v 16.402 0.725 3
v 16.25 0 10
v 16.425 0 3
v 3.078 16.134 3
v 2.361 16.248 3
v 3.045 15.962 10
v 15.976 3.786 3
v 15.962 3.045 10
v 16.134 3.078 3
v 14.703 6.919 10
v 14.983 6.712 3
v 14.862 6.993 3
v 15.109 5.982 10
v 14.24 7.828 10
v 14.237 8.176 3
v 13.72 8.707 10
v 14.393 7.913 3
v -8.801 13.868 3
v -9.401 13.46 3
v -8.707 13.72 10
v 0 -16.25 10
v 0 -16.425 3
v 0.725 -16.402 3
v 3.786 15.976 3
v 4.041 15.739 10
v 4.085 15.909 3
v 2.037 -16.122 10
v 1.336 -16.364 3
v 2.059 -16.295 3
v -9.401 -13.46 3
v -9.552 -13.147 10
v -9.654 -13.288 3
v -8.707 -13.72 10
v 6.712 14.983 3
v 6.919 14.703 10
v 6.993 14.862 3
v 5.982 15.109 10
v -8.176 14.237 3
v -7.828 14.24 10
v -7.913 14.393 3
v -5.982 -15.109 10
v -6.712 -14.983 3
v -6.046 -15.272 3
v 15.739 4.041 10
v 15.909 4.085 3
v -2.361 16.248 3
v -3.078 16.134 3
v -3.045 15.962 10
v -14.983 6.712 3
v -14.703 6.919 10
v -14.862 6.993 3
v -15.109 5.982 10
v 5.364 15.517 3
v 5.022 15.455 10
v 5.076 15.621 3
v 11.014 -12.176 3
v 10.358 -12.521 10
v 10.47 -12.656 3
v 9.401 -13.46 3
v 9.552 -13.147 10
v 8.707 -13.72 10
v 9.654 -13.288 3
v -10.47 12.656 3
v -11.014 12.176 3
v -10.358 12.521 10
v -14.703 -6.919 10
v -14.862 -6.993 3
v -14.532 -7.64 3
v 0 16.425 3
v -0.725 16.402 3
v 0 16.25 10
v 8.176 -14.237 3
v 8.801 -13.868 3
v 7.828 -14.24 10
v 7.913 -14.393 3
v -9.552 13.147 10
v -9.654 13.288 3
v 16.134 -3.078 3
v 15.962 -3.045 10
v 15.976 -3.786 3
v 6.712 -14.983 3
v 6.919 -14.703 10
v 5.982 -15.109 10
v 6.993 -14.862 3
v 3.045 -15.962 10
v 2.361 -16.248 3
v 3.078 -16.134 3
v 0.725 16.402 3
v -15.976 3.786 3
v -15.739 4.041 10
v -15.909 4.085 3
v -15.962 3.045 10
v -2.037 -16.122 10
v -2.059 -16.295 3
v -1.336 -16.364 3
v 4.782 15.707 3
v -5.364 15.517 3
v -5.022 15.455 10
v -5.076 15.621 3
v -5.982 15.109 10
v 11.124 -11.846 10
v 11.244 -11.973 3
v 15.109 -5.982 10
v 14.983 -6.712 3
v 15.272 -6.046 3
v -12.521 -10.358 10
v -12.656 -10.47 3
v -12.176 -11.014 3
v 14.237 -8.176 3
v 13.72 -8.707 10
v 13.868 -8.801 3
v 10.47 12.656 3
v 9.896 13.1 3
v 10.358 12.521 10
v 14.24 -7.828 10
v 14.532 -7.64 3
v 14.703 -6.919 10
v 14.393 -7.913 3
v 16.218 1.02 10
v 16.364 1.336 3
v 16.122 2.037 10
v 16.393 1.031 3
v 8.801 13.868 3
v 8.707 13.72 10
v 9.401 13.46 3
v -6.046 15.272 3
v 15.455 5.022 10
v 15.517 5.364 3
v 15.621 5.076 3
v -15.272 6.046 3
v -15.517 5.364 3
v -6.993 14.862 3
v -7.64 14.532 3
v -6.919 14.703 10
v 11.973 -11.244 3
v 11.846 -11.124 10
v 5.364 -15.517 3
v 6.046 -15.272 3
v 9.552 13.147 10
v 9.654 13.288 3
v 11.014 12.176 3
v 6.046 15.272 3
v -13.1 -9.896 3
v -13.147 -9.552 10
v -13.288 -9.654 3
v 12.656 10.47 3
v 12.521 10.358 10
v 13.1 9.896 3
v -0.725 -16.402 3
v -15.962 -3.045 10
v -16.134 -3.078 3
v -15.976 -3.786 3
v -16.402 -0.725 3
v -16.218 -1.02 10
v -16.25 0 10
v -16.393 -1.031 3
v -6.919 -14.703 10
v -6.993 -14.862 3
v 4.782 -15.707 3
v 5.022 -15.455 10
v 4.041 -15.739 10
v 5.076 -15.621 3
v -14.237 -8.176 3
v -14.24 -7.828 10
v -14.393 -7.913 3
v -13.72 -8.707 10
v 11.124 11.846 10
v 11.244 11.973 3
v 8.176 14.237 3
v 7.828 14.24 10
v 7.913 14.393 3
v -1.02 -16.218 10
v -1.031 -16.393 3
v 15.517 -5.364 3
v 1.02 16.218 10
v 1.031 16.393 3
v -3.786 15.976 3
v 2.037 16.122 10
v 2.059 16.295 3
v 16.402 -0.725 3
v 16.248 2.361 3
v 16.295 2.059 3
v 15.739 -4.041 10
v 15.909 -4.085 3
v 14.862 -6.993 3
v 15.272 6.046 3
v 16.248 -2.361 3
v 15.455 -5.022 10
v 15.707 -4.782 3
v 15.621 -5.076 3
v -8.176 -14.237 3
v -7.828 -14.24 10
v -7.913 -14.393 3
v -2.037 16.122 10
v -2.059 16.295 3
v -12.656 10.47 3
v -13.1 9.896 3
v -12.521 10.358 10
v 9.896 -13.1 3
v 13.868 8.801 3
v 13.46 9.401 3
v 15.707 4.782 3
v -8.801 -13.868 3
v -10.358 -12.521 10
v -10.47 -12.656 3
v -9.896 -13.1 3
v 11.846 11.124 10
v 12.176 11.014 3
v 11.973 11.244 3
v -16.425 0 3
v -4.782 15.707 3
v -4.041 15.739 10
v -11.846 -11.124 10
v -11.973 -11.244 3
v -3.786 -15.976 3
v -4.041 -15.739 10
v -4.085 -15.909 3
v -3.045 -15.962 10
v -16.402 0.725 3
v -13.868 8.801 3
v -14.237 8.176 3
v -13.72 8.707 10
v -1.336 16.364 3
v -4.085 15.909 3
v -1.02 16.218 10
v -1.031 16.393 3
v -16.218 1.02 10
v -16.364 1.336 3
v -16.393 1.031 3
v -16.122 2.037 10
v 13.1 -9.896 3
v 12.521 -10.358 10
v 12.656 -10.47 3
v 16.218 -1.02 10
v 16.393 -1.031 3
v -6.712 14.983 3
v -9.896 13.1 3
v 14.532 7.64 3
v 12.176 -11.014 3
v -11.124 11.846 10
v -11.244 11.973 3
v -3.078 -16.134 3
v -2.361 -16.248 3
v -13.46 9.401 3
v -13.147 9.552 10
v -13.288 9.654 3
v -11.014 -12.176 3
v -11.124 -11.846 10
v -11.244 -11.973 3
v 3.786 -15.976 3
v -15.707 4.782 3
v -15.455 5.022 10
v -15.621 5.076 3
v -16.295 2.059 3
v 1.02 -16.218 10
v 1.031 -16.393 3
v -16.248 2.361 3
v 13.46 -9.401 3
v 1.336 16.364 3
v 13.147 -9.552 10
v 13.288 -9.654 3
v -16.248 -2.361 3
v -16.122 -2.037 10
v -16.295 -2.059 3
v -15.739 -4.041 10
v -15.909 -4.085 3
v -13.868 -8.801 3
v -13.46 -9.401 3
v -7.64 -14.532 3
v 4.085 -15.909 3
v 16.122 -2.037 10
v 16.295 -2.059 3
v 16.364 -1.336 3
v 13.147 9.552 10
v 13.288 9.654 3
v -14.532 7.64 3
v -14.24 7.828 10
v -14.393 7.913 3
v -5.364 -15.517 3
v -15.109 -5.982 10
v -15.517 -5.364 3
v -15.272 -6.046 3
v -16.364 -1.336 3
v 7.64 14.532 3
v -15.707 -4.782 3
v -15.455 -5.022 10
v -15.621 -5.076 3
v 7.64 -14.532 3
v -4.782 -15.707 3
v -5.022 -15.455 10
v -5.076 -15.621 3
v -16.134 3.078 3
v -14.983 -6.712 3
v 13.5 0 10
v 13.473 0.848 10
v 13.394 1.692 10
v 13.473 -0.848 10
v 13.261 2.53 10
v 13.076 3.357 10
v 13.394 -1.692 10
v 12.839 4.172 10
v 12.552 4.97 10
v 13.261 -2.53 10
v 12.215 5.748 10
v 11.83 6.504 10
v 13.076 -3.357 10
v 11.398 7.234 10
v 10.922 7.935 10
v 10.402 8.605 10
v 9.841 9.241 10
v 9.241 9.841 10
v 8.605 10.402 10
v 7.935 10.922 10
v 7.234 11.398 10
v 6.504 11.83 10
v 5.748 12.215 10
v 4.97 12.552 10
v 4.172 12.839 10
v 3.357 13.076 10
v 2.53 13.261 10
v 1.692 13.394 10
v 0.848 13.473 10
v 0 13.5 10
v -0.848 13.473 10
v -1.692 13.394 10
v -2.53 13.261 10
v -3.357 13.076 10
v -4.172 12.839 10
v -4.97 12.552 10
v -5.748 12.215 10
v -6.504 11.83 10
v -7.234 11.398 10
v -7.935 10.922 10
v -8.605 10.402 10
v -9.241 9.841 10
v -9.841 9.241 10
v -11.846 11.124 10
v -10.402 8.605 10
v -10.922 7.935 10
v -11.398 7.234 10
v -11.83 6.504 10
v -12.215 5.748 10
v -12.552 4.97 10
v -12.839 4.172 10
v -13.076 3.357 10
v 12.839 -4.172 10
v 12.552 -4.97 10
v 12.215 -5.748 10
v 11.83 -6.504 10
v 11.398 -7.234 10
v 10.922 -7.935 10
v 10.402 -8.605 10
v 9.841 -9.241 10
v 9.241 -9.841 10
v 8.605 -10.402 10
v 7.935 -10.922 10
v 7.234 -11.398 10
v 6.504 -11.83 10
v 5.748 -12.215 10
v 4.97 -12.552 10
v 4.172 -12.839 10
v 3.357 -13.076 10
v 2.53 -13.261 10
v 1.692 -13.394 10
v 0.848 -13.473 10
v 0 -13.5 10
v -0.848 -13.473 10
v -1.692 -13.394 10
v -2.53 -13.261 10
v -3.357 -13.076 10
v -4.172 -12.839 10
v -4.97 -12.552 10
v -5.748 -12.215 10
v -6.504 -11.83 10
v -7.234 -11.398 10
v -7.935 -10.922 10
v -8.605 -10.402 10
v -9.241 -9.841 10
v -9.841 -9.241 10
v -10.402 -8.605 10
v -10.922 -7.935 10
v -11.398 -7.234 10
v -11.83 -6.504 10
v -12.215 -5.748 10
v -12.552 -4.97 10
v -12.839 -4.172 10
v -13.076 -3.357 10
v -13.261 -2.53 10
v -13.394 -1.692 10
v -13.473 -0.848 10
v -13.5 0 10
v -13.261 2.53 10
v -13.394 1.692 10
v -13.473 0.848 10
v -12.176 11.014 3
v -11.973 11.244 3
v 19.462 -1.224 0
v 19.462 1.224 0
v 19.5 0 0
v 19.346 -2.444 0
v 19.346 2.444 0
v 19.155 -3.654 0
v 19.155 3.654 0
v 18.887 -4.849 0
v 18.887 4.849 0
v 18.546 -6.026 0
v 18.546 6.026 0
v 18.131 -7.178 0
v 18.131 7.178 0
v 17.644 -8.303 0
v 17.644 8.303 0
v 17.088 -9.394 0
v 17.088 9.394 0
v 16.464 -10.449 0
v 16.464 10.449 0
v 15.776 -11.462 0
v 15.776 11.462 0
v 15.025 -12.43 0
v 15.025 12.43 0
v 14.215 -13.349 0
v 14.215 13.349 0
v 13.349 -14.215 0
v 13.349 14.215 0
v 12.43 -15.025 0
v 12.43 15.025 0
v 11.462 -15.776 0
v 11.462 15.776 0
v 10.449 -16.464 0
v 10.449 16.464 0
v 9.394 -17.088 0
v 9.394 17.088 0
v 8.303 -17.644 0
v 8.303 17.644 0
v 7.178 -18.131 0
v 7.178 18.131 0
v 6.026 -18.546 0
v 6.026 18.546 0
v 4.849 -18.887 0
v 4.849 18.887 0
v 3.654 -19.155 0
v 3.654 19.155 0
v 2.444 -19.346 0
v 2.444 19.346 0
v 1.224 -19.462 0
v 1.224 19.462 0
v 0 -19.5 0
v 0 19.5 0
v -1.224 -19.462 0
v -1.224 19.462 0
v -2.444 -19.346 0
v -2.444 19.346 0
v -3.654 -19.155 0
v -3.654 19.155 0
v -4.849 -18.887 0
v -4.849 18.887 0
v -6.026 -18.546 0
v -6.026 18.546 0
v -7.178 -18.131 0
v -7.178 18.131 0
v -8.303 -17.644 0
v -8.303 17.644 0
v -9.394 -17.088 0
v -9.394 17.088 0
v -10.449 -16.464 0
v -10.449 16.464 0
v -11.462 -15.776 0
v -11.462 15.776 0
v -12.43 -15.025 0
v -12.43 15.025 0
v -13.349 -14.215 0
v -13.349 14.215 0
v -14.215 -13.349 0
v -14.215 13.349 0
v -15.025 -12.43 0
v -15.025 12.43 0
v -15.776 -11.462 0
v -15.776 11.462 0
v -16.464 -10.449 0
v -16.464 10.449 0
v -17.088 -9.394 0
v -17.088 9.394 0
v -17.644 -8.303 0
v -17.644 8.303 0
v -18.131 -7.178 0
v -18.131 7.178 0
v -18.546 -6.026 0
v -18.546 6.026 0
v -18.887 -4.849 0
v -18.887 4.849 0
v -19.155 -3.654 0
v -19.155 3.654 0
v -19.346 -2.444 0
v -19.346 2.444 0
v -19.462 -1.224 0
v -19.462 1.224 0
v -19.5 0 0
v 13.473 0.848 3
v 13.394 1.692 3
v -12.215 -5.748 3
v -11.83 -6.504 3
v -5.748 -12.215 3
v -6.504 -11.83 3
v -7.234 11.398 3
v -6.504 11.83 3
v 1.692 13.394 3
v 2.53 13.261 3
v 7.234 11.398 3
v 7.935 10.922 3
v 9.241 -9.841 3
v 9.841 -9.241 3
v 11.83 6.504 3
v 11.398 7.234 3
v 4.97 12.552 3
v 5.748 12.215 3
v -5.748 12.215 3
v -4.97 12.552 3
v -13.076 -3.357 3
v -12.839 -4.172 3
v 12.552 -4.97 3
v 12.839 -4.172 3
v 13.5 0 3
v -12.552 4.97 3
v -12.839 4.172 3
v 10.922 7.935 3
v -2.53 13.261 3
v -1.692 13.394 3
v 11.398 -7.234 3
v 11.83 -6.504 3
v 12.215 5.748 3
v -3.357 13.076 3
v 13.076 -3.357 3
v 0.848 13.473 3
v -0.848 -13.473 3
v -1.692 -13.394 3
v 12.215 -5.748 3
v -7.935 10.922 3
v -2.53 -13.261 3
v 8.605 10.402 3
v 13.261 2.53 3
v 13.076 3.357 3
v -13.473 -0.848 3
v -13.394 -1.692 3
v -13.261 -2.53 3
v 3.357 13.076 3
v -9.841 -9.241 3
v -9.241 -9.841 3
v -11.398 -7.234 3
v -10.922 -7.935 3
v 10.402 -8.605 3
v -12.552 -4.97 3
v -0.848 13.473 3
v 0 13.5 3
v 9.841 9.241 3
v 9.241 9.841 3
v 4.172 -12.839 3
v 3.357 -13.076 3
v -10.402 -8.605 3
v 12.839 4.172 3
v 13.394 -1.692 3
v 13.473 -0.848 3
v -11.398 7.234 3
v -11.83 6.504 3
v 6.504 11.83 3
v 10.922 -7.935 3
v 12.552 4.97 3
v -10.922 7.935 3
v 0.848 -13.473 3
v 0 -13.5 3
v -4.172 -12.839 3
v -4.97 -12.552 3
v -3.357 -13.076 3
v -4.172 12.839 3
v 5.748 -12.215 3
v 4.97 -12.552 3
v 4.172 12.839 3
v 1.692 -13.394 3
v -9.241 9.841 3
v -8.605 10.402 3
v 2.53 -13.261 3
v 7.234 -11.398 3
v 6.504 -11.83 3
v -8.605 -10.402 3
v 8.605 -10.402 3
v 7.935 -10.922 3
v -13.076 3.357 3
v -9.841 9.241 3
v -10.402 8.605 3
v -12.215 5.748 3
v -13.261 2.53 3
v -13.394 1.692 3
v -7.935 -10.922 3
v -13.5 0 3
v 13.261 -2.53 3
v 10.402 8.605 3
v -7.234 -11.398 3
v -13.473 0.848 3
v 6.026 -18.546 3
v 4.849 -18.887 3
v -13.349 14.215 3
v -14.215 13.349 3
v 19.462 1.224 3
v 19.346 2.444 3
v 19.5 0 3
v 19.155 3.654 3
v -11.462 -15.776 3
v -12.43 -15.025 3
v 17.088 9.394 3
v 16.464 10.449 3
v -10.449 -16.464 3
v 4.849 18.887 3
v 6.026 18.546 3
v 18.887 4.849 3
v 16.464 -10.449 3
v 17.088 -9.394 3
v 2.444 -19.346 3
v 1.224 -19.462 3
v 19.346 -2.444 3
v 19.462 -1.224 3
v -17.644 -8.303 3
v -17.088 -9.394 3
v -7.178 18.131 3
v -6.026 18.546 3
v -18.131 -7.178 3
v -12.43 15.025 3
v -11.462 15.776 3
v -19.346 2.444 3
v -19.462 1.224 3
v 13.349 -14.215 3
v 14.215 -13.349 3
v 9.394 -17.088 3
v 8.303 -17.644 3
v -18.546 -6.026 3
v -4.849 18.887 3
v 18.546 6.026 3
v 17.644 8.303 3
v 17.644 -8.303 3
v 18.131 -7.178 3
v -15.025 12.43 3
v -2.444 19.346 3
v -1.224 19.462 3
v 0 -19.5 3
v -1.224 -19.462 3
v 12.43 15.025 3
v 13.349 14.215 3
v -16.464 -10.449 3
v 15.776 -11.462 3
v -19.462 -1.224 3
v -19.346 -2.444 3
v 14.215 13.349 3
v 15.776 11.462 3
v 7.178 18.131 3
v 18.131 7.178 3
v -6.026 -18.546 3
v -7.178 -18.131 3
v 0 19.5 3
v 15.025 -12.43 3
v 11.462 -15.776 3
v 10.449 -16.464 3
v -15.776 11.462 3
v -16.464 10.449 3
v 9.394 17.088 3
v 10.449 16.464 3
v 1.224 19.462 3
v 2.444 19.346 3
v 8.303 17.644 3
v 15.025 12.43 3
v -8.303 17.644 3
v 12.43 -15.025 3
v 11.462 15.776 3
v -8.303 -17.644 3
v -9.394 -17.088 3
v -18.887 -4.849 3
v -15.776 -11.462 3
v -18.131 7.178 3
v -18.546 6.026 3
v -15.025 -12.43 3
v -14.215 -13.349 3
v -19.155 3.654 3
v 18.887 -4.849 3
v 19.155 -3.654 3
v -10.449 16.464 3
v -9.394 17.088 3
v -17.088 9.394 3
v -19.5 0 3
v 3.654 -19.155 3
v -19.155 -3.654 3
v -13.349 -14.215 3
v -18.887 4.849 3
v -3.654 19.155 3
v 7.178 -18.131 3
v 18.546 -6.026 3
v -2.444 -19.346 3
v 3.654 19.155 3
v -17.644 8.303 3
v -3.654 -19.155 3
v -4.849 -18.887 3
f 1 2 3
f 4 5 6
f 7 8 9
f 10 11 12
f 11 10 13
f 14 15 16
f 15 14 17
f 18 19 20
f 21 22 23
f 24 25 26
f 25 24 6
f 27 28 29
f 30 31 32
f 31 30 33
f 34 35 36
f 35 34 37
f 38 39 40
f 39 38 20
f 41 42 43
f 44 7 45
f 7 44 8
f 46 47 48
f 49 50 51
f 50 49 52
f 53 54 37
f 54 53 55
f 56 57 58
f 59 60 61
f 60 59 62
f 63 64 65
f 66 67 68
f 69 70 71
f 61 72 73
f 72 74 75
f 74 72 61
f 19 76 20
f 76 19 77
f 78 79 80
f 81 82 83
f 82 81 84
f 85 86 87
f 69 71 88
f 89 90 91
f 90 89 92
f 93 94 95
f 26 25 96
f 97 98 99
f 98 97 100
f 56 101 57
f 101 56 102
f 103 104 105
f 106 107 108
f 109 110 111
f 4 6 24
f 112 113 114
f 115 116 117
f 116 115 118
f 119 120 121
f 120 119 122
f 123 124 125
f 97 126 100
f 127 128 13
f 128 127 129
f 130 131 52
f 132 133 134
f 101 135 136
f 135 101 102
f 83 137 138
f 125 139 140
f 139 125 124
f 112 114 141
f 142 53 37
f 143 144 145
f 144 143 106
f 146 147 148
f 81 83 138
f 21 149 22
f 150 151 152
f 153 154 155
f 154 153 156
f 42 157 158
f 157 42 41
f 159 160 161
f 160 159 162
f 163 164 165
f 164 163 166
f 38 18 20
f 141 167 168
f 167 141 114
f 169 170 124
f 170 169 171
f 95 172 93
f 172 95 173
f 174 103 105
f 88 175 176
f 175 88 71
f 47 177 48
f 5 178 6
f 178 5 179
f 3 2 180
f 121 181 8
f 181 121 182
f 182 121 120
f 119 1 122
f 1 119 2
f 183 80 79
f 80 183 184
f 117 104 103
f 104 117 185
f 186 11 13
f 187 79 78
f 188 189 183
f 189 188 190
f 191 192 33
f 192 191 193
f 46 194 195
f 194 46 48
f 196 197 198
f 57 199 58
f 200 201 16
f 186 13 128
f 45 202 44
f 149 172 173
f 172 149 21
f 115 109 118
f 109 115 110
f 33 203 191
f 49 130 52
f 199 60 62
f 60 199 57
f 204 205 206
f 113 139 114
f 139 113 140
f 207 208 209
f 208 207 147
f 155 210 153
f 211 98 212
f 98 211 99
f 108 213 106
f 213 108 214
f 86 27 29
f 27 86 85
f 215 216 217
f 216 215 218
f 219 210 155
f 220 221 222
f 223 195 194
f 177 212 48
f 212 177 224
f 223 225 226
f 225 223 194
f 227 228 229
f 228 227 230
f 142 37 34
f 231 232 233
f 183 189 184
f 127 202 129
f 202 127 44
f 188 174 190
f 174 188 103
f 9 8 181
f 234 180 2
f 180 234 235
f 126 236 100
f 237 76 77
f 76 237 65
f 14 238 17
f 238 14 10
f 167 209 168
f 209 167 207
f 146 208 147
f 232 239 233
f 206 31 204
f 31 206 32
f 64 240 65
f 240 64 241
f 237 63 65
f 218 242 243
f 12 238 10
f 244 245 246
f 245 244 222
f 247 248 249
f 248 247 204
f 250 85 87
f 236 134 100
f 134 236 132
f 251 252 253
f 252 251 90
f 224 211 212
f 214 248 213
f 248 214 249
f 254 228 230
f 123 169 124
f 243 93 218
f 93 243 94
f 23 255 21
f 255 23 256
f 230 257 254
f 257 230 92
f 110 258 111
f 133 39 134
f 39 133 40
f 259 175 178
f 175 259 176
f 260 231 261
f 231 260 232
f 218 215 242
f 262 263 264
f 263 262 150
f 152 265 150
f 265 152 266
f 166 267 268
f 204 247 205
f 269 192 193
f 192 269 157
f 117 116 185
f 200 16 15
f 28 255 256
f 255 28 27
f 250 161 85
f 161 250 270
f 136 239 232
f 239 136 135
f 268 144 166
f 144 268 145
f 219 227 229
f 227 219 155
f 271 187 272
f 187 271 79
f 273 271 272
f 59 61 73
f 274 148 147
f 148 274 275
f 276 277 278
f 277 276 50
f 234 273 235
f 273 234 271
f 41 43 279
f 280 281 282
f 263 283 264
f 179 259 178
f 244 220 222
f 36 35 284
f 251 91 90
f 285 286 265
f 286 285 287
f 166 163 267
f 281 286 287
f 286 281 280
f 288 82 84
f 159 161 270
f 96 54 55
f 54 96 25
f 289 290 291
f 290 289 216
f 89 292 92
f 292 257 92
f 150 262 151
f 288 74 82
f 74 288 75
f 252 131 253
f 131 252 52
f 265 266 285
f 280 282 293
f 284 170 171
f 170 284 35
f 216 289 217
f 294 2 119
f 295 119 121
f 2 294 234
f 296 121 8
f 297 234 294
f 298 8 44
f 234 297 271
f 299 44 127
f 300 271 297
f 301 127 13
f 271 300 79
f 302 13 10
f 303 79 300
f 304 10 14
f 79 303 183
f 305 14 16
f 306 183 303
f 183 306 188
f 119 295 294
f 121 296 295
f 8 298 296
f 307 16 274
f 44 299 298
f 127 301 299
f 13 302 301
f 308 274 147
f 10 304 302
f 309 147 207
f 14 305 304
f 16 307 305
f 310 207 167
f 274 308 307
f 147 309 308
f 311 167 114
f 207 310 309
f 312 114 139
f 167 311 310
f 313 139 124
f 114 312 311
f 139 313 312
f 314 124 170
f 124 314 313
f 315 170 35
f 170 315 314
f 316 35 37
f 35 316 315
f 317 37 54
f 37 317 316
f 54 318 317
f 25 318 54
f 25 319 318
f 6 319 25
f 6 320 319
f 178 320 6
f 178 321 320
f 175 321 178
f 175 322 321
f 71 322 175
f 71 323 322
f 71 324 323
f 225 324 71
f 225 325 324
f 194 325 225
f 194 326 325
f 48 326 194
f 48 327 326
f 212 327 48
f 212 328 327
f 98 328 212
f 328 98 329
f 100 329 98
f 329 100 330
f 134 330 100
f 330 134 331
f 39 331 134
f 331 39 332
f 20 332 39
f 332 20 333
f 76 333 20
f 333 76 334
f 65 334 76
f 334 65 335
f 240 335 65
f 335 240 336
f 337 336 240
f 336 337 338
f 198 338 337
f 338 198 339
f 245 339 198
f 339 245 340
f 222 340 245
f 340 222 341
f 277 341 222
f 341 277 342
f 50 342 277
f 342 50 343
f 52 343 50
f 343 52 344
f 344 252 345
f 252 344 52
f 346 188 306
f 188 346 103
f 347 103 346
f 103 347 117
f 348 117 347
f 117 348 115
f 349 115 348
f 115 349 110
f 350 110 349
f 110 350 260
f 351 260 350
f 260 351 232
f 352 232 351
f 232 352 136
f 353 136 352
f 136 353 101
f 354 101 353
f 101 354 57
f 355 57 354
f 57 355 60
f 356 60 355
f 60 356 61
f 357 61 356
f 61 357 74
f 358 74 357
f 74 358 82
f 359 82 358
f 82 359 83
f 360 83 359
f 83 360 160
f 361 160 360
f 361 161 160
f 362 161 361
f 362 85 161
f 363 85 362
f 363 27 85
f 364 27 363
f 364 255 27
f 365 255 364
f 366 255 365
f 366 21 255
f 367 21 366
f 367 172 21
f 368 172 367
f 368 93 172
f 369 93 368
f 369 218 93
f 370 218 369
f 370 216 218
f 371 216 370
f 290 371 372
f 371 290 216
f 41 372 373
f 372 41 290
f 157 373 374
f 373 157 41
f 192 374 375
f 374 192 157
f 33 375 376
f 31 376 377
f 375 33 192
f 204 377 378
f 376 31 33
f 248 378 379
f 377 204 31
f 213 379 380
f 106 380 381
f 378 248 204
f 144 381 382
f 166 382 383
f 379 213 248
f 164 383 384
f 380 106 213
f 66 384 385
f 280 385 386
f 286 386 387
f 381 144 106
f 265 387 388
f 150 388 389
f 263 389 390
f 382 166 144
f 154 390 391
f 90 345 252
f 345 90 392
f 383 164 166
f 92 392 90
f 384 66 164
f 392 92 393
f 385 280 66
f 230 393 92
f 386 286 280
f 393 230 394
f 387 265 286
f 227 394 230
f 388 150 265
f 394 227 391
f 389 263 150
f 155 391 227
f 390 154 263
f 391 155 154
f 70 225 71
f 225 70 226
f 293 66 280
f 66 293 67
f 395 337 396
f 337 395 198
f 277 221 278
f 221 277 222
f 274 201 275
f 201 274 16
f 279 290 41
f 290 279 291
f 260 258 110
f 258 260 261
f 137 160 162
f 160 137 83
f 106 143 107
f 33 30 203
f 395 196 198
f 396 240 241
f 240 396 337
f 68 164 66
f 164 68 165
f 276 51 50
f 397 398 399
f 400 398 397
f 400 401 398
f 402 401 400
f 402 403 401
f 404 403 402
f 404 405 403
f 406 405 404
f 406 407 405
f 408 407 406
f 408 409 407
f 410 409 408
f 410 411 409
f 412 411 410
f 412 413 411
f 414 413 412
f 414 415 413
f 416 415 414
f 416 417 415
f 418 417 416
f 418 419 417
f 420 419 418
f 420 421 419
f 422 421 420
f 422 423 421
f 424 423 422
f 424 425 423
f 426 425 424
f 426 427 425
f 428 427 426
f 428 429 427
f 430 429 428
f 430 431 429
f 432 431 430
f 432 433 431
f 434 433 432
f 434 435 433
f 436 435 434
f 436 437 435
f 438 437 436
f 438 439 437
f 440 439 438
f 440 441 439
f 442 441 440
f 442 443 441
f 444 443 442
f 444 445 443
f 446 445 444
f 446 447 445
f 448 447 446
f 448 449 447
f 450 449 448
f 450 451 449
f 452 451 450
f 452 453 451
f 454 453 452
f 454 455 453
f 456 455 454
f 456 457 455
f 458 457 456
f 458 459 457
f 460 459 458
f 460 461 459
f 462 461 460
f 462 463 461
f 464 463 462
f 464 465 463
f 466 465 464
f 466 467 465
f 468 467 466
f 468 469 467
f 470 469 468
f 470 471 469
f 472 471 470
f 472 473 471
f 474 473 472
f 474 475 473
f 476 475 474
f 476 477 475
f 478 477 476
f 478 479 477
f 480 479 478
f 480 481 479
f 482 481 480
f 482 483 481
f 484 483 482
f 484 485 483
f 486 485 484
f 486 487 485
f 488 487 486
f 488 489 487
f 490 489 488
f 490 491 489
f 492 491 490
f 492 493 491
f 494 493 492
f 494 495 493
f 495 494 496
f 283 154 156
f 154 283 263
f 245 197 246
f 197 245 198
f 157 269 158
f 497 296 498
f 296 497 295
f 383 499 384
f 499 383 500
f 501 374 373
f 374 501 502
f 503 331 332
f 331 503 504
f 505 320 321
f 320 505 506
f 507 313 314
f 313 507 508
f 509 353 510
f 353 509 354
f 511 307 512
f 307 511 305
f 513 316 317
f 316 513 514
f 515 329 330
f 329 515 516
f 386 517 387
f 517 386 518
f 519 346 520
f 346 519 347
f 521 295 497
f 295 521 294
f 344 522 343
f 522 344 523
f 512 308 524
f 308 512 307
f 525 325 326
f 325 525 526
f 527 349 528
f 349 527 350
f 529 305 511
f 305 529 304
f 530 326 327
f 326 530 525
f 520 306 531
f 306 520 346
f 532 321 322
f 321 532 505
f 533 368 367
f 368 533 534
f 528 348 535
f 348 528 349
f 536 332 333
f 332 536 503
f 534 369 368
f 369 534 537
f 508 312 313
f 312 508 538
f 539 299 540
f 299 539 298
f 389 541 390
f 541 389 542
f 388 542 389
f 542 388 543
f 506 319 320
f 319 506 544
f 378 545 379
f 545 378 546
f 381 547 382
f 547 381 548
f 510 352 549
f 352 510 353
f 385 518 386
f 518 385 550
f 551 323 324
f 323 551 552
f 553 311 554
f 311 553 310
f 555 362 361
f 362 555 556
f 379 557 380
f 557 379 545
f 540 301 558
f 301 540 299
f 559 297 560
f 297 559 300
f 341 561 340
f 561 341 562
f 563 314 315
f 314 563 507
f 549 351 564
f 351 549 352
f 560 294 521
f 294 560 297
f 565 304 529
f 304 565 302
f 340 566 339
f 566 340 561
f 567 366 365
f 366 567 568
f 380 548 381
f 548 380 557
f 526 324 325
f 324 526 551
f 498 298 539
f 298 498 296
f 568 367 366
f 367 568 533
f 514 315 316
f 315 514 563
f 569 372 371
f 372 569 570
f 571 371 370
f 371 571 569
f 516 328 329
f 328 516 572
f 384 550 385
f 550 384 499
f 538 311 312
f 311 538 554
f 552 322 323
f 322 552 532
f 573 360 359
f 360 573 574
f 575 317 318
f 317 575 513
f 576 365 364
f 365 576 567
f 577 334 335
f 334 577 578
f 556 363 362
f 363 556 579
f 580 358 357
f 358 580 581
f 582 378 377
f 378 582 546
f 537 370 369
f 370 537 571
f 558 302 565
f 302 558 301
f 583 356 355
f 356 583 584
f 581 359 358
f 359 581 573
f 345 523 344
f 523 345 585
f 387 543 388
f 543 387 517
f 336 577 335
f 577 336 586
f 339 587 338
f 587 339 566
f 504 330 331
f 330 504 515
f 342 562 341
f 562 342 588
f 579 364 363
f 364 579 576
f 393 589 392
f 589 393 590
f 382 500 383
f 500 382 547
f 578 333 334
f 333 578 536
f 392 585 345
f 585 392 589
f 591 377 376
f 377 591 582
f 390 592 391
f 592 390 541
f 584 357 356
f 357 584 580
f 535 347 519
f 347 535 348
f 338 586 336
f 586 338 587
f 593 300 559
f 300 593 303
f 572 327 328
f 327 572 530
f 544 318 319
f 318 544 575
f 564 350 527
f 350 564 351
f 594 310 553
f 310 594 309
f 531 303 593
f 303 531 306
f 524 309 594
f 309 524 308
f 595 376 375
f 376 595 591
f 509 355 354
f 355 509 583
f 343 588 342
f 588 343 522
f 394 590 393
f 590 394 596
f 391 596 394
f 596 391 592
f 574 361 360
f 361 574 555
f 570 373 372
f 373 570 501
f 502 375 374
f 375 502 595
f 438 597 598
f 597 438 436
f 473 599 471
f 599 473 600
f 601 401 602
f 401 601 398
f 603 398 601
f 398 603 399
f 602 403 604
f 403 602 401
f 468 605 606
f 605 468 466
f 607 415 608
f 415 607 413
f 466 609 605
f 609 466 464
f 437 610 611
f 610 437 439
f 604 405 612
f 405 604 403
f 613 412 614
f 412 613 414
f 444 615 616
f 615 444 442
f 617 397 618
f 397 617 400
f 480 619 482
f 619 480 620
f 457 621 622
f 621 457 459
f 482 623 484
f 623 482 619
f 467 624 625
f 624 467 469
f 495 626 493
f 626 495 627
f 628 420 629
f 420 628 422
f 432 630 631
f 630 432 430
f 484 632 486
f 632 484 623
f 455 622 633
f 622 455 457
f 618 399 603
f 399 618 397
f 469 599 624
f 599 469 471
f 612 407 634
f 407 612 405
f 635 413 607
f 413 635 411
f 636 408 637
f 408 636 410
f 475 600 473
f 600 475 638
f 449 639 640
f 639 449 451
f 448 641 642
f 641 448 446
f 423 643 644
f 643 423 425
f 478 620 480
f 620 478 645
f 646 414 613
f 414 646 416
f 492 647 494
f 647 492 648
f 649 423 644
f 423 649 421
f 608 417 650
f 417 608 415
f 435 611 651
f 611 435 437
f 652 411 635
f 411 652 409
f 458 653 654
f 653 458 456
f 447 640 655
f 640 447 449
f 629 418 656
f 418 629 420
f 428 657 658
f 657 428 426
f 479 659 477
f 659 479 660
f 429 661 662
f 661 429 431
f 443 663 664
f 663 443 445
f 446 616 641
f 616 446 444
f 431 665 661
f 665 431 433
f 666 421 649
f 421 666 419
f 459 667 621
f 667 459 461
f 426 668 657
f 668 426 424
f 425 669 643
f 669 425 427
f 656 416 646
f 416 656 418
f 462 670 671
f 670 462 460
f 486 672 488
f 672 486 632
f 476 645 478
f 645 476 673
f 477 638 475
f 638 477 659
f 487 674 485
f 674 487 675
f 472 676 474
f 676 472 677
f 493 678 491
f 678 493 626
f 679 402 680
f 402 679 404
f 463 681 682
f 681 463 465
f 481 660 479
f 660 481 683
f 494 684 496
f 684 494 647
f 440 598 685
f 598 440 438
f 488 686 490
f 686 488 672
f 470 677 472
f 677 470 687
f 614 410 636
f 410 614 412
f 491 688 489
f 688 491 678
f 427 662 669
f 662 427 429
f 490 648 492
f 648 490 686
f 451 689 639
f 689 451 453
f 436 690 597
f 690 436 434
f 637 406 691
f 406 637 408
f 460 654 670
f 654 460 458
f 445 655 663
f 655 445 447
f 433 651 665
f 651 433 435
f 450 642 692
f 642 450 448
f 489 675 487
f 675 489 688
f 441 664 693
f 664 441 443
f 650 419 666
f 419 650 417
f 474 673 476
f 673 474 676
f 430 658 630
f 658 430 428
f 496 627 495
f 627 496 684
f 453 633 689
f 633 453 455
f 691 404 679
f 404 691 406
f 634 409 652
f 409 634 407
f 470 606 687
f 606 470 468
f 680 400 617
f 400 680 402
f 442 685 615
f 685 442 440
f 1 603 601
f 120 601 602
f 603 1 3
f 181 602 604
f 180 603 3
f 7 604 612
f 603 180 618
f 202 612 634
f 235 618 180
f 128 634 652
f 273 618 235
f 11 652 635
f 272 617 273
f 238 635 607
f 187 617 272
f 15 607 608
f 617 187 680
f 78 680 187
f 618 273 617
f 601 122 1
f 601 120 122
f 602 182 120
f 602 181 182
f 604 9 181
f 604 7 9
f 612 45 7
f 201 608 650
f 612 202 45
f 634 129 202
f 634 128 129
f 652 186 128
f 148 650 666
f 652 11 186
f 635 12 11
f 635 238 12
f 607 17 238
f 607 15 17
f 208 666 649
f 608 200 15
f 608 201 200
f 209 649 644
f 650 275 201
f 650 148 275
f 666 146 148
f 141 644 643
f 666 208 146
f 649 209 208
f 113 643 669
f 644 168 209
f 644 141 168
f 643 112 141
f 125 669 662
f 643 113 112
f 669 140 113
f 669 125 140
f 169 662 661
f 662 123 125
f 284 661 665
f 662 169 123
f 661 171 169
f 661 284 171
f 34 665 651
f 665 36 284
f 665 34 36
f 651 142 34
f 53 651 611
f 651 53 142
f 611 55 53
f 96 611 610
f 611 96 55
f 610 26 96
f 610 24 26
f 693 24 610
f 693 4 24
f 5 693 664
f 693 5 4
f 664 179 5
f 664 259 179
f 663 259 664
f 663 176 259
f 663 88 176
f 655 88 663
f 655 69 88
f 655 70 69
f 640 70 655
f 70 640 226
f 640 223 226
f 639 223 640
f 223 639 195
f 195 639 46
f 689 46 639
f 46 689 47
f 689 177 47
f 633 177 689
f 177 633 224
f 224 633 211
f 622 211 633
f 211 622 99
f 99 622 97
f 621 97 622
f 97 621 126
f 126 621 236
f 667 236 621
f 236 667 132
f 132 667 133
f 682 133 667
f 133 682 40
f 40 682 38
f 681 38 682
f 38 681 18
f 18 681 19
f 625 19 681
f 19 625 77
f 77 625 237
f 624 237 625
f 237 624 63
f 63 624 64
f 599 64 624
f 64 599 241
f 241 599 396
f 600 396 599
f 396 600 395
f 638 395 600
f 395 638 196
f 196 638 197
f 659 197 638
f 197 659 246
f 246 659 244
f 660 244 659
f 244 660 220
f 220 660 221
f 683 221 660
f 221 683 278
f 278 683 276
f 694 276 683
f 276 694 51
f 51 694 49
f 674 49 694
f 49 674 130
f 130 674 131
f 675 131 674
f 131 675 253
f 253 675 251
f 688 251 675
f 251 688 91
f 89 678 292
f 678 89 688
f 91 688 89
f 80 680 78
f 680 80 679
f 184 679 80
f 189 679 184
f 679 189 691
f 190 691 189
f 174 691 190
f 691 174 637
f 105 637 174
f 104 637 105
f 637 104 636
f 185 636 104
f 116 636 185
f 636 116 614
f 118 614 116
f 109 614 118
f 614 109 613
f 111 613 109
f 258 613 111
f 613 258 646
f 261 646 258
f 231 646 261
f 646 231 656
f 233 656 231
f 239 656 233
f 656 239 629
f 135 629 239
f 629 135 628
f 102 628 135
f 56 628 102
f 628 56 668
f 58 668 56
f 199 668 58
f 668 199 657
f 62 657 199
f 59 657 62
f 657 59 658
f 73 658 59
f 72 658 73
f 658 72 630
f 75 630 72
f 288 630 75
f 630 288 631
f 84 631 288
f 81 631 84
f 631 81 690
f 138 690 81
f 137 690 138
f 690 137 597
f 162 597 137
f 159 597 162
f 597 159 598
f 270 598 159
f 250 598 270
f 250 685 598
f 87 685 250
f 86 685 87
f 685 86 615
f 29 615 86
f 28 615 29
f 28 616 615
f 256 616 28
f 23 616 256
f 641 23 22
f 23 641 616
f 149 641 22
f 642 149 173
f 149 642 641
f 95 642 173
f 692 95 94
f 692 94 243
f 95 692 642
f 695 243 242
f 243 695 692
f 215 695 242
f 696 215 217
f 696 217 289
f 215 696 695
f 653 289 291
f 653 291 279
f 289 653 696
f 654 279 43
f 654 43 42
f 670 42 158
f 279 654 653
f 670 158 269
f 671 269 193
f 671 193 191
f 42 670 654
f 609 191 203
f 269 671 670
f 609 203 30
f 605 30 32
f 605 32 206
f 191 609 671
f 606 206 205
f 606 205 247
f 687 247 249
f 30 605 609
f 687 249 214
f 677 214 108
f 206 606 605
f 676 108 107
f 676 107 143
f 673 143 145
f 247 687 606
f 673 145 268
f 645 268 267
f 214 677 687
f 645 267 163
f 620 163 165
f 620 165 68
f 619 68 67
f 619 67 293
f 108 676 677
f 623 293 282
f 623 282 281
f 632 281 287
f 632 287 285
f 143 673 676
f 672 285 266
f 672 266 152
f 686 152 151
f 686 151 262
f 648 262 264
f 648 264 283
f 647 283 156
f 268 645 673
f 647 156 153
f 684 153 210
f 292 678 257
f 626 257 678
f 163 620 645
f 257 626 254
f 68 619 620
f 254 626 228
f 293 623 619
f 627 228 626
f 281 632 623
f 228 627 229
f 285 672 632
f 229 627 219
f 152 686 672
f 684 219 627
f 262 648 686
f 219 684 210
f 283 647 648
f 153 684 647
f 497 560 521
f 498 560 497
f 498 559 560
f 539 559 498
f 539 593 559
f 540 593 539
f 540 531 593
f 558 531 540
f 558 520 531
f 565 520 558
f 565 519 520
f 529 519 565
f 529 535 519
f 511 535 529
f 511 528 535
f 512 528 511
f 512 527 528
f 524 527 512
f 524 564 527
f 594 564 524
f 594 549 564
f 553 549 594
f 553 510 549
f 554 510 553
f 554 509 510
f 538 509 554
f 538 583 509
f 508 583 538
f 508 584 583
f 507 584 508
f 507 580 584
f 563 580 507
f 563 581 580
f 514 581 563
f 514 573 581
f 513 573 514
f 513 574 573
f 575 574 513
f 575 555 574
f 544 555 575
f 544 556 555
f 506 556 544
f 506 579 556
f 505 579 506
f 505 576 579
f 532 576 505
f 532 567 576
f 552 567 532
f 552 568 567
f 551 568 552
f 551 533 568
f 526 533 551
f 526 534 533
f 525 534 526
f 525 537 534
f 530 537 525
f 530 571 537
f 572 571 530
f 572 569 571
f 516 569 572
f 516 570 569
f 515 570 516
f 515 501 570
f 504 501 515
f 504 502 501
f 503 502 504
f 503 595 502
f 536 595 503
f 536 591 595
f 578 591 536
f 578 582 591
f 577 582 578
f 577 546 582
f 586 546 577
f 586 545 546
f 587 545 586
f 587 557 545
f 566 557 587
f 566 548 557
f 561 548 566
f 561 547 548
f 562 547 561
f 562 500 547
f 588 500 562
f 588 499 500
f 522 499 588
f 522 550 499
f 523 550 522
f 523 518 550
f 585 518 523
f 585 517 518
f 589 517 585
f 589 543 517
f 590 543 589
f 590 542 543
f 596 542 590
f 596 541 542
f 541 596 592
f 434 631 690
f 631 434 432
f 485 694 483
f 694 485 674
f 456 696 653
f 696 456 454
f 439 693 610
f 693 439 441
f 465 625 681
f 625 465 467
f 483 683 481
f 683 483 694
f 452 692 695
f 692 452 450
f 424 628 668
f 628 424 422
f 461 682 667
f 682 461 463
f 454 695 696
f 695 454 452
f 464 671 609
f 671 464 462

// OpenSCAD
// end cap for pvc fitting


$fn=100;

PR=16.5;    //enter pvc pipe radius here (for standard 1" PVC, PR=16.90; for 32mm PR = 16.5)

//inner
difference(){
    cylinder(10,PR,PR-0.25); 
    cylinder(12,PR-3,PR-3);
    }
//end
cylinder(3,PR+3,PR+3); 
